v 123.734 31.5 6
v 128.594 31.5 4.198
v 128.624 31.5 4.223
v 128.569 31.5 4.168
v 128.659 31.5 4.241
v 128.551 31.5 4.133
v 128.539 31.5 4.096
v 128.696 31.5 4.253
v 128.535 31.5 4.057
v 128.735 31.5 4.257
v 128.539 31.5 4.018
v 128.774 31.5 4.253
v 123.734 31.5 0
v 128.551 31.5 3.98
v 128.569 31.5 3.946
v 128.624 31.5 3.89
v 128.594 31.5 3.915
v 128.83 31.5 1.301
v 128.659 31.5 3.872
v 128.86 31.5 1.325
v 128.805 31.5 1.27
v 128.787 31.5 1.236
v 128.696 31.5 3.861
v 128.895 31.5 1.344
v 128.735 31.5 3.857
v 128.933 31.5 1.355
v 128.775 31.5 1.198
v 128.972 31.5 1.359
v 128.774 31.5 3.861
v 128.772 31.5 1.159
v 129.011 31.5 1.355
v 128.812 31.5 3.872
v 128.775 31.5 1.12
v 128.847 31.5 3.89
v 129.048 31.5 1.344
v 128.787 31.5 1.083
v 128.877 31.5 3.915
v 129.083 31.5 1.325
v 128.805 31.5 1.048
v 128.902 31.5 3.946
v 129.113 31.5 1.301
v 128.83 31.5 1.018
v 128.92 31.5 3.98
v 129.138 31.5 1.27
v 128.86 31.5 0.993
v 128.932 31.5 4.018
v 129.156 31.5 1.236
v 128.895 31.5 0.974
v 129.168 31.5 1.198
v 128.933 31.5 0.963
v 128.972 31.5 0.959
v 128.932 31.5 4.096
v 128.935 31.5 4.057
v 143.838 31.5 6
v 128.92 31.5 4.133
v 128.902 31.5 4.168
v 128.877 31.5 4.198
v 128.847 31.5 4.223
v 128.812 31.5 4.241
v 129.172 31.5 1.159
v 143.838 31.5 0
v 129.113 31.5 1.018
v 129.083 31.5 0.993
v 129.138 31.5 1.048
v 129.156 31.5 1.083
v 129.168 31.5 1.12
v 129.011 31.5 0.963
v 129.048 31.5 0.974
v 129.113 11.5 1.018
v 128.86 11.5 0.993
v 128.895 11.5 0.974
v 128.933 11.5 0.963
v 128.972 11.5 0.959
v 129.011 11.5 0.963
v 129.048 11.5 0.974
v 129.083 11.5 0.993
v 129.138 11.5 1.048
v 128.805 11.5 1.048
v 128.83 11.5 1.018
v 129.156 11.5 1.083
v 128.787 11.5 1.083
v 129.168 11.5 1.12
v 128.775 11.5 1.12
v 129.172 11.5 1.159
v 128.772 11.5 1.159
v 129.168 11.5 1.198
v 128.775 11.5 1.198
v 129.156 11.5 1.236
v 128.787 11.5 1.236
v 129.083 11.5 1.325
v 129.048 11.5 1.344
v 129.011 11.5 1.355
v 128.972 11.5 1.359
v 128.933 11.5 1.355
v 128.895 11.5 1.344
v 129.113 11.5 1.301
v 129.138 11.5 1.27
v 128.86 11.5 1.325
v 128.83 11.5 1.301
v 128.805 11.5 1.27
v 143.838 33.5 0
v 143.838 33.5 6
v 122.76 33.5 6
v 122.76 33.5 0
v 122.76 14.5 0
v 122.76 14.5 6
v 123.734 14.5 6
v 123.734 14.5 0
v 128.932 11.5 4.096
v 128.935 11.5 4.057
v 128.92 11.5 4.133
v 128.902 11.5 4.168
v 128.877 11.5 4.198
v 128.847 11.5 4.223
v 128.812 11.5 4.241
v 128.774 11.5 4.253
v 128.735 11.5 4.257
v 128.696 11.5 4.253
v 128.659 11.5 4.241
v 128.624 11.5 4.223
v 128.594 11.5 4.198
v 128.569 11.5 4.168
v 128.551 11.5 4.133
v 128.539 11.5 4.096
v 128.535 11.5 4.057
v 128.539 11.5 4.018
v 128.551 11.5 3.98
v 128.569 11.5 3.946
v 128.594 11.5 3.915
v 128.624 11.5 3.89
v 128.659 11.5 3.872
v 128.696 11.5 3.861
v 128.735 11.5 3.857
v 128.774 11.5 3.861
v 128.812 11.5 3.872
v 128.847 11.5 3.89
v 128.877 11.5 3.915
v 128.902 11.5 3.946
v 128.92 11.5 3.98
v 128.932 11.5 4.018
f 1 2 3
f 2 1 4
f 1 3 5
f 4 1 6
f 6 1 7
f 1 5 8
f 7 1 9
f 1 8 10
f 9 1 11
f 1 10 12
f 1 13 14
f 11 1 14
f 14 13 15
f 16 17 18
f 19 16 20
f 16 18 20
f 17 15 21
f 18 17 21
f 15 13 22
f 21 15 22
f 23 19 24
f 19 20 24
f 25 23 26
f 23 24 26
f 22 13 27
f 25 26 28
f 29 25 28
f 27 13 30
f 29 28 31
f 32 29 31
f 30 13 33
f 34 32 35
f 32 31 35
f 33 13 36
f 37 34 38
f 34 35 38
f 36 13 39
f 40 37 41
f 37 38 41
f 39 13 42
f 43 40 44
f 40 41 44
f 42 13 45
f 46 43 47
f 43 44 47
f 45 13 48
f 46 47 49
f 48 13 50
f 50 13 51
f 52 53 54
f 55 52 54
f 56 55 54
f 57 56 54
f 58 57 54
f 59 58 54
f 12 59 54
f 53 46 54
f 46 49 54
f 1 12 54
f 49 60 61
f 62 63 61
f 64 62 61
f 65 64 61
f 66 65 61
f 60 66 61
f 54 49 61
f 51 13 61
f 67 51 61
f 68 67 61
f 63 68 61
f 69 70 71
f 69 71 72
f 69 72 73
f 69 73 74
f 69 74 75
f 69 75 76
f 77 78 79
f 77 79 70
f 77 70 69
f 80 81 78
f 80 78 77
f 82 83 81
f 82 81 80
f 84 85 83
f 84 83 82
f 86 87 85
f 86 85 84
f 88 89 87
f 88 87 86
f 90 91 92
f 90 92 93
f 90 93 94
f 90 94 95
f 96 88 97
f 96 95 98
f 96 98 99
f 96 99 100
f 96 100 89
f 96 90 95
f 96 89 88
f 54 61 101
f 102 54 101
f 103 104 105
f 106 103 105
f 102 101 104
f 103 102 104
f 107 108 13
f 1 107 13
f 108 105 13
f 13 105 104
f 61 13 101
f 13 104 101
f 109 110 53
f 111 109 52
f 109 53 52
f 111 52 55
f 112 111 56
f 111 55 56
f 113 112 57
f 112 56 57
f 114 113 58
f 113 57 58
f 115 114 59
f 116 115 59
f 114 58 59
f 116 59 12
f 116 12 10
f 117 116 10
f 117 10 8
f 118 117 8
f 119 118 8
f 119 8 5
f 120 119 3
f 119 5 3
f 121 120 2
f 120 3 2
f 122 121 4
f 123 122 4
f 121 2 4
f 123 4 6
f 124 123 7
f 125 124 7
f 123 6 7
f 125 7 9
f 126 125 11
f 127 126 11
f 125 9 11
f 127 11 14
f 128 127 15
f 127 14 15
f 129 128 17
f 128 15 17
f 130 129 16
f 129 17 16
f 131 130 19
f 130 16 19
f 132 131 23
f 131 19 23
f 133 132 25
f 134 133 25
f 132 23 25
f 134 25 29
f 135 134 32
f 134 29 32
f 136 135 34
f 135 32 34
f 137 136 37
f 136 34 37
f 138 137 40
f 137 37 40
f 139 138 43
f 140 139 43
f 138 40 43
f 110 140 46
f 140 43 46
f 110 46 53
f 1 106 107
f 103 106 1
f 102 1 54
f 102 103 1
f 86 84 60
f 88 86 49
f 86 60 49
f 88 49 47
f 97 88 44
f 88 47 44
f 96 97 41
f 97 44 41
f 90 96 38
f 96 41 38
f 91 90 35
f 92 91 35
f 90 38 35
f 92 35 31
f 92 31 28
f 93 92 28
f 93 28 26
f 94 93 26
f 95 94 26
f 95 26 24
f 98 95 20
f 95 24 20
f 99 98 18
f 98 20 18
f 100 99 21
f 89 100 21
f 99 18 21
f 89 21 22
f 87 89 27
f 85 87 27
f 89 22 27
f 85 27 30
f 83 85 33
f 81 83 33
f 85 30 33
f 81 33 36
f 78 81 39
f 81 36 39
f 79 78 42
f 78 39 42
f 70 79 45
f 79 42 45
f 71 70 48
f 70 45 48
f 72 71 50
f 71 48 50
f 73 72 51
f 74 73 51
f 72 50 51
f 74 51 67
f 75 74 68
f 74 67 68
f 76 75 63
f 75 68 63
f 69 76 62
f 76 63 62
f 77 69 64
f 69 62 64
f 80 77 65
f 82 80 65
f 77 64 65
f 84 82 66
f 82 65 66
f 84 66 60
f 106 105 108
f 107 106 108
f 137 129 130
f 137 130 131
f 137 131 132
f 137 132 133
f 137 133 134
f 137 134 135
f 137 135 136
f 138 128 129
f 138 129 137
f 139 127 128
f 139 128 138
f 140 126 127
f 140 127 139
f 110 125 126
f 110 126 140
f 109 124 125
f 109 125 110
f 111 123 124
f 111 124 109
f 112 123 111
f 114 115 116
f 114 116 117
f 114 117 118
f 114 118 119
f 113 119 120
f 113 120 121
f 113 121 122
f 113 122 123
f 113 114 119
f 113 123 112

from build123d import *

# Parameters (mm, degrees)
EXTRUSION1_DEPTH = 6
ESQUISSE2_R      = 0.2
EXTRUSION2_DEPTH = 20


with BuildPart() as part:
    # Esquisse1 → Extrusion1 (new body)
    with BuildSketch(Plane.XY):
        Polygon((123.733692342, 14.5), (123.733692342, 31.5), (143.838461576, 31.5), (143.838461576, 33.5), (122.759551823, 33.5), (122.759551823, 14.5), align=None)
    extrude(amount=EXTRUSION1_DEPTH)

    # Esquisse2 → Extrusion2 (add)
    with BuildSketch(Plane.XZ.offset(-31.5)):
        with Locations((128.735391716, 4.056660757)):
            Circle(ESQUISSE2_R)
        with Locations((128.971557812, 1.159084415)):
            Circle(ESQUISSE2_R)
    extrude(amount=EXTRUSION2_DEPTH)


solid = part.part
